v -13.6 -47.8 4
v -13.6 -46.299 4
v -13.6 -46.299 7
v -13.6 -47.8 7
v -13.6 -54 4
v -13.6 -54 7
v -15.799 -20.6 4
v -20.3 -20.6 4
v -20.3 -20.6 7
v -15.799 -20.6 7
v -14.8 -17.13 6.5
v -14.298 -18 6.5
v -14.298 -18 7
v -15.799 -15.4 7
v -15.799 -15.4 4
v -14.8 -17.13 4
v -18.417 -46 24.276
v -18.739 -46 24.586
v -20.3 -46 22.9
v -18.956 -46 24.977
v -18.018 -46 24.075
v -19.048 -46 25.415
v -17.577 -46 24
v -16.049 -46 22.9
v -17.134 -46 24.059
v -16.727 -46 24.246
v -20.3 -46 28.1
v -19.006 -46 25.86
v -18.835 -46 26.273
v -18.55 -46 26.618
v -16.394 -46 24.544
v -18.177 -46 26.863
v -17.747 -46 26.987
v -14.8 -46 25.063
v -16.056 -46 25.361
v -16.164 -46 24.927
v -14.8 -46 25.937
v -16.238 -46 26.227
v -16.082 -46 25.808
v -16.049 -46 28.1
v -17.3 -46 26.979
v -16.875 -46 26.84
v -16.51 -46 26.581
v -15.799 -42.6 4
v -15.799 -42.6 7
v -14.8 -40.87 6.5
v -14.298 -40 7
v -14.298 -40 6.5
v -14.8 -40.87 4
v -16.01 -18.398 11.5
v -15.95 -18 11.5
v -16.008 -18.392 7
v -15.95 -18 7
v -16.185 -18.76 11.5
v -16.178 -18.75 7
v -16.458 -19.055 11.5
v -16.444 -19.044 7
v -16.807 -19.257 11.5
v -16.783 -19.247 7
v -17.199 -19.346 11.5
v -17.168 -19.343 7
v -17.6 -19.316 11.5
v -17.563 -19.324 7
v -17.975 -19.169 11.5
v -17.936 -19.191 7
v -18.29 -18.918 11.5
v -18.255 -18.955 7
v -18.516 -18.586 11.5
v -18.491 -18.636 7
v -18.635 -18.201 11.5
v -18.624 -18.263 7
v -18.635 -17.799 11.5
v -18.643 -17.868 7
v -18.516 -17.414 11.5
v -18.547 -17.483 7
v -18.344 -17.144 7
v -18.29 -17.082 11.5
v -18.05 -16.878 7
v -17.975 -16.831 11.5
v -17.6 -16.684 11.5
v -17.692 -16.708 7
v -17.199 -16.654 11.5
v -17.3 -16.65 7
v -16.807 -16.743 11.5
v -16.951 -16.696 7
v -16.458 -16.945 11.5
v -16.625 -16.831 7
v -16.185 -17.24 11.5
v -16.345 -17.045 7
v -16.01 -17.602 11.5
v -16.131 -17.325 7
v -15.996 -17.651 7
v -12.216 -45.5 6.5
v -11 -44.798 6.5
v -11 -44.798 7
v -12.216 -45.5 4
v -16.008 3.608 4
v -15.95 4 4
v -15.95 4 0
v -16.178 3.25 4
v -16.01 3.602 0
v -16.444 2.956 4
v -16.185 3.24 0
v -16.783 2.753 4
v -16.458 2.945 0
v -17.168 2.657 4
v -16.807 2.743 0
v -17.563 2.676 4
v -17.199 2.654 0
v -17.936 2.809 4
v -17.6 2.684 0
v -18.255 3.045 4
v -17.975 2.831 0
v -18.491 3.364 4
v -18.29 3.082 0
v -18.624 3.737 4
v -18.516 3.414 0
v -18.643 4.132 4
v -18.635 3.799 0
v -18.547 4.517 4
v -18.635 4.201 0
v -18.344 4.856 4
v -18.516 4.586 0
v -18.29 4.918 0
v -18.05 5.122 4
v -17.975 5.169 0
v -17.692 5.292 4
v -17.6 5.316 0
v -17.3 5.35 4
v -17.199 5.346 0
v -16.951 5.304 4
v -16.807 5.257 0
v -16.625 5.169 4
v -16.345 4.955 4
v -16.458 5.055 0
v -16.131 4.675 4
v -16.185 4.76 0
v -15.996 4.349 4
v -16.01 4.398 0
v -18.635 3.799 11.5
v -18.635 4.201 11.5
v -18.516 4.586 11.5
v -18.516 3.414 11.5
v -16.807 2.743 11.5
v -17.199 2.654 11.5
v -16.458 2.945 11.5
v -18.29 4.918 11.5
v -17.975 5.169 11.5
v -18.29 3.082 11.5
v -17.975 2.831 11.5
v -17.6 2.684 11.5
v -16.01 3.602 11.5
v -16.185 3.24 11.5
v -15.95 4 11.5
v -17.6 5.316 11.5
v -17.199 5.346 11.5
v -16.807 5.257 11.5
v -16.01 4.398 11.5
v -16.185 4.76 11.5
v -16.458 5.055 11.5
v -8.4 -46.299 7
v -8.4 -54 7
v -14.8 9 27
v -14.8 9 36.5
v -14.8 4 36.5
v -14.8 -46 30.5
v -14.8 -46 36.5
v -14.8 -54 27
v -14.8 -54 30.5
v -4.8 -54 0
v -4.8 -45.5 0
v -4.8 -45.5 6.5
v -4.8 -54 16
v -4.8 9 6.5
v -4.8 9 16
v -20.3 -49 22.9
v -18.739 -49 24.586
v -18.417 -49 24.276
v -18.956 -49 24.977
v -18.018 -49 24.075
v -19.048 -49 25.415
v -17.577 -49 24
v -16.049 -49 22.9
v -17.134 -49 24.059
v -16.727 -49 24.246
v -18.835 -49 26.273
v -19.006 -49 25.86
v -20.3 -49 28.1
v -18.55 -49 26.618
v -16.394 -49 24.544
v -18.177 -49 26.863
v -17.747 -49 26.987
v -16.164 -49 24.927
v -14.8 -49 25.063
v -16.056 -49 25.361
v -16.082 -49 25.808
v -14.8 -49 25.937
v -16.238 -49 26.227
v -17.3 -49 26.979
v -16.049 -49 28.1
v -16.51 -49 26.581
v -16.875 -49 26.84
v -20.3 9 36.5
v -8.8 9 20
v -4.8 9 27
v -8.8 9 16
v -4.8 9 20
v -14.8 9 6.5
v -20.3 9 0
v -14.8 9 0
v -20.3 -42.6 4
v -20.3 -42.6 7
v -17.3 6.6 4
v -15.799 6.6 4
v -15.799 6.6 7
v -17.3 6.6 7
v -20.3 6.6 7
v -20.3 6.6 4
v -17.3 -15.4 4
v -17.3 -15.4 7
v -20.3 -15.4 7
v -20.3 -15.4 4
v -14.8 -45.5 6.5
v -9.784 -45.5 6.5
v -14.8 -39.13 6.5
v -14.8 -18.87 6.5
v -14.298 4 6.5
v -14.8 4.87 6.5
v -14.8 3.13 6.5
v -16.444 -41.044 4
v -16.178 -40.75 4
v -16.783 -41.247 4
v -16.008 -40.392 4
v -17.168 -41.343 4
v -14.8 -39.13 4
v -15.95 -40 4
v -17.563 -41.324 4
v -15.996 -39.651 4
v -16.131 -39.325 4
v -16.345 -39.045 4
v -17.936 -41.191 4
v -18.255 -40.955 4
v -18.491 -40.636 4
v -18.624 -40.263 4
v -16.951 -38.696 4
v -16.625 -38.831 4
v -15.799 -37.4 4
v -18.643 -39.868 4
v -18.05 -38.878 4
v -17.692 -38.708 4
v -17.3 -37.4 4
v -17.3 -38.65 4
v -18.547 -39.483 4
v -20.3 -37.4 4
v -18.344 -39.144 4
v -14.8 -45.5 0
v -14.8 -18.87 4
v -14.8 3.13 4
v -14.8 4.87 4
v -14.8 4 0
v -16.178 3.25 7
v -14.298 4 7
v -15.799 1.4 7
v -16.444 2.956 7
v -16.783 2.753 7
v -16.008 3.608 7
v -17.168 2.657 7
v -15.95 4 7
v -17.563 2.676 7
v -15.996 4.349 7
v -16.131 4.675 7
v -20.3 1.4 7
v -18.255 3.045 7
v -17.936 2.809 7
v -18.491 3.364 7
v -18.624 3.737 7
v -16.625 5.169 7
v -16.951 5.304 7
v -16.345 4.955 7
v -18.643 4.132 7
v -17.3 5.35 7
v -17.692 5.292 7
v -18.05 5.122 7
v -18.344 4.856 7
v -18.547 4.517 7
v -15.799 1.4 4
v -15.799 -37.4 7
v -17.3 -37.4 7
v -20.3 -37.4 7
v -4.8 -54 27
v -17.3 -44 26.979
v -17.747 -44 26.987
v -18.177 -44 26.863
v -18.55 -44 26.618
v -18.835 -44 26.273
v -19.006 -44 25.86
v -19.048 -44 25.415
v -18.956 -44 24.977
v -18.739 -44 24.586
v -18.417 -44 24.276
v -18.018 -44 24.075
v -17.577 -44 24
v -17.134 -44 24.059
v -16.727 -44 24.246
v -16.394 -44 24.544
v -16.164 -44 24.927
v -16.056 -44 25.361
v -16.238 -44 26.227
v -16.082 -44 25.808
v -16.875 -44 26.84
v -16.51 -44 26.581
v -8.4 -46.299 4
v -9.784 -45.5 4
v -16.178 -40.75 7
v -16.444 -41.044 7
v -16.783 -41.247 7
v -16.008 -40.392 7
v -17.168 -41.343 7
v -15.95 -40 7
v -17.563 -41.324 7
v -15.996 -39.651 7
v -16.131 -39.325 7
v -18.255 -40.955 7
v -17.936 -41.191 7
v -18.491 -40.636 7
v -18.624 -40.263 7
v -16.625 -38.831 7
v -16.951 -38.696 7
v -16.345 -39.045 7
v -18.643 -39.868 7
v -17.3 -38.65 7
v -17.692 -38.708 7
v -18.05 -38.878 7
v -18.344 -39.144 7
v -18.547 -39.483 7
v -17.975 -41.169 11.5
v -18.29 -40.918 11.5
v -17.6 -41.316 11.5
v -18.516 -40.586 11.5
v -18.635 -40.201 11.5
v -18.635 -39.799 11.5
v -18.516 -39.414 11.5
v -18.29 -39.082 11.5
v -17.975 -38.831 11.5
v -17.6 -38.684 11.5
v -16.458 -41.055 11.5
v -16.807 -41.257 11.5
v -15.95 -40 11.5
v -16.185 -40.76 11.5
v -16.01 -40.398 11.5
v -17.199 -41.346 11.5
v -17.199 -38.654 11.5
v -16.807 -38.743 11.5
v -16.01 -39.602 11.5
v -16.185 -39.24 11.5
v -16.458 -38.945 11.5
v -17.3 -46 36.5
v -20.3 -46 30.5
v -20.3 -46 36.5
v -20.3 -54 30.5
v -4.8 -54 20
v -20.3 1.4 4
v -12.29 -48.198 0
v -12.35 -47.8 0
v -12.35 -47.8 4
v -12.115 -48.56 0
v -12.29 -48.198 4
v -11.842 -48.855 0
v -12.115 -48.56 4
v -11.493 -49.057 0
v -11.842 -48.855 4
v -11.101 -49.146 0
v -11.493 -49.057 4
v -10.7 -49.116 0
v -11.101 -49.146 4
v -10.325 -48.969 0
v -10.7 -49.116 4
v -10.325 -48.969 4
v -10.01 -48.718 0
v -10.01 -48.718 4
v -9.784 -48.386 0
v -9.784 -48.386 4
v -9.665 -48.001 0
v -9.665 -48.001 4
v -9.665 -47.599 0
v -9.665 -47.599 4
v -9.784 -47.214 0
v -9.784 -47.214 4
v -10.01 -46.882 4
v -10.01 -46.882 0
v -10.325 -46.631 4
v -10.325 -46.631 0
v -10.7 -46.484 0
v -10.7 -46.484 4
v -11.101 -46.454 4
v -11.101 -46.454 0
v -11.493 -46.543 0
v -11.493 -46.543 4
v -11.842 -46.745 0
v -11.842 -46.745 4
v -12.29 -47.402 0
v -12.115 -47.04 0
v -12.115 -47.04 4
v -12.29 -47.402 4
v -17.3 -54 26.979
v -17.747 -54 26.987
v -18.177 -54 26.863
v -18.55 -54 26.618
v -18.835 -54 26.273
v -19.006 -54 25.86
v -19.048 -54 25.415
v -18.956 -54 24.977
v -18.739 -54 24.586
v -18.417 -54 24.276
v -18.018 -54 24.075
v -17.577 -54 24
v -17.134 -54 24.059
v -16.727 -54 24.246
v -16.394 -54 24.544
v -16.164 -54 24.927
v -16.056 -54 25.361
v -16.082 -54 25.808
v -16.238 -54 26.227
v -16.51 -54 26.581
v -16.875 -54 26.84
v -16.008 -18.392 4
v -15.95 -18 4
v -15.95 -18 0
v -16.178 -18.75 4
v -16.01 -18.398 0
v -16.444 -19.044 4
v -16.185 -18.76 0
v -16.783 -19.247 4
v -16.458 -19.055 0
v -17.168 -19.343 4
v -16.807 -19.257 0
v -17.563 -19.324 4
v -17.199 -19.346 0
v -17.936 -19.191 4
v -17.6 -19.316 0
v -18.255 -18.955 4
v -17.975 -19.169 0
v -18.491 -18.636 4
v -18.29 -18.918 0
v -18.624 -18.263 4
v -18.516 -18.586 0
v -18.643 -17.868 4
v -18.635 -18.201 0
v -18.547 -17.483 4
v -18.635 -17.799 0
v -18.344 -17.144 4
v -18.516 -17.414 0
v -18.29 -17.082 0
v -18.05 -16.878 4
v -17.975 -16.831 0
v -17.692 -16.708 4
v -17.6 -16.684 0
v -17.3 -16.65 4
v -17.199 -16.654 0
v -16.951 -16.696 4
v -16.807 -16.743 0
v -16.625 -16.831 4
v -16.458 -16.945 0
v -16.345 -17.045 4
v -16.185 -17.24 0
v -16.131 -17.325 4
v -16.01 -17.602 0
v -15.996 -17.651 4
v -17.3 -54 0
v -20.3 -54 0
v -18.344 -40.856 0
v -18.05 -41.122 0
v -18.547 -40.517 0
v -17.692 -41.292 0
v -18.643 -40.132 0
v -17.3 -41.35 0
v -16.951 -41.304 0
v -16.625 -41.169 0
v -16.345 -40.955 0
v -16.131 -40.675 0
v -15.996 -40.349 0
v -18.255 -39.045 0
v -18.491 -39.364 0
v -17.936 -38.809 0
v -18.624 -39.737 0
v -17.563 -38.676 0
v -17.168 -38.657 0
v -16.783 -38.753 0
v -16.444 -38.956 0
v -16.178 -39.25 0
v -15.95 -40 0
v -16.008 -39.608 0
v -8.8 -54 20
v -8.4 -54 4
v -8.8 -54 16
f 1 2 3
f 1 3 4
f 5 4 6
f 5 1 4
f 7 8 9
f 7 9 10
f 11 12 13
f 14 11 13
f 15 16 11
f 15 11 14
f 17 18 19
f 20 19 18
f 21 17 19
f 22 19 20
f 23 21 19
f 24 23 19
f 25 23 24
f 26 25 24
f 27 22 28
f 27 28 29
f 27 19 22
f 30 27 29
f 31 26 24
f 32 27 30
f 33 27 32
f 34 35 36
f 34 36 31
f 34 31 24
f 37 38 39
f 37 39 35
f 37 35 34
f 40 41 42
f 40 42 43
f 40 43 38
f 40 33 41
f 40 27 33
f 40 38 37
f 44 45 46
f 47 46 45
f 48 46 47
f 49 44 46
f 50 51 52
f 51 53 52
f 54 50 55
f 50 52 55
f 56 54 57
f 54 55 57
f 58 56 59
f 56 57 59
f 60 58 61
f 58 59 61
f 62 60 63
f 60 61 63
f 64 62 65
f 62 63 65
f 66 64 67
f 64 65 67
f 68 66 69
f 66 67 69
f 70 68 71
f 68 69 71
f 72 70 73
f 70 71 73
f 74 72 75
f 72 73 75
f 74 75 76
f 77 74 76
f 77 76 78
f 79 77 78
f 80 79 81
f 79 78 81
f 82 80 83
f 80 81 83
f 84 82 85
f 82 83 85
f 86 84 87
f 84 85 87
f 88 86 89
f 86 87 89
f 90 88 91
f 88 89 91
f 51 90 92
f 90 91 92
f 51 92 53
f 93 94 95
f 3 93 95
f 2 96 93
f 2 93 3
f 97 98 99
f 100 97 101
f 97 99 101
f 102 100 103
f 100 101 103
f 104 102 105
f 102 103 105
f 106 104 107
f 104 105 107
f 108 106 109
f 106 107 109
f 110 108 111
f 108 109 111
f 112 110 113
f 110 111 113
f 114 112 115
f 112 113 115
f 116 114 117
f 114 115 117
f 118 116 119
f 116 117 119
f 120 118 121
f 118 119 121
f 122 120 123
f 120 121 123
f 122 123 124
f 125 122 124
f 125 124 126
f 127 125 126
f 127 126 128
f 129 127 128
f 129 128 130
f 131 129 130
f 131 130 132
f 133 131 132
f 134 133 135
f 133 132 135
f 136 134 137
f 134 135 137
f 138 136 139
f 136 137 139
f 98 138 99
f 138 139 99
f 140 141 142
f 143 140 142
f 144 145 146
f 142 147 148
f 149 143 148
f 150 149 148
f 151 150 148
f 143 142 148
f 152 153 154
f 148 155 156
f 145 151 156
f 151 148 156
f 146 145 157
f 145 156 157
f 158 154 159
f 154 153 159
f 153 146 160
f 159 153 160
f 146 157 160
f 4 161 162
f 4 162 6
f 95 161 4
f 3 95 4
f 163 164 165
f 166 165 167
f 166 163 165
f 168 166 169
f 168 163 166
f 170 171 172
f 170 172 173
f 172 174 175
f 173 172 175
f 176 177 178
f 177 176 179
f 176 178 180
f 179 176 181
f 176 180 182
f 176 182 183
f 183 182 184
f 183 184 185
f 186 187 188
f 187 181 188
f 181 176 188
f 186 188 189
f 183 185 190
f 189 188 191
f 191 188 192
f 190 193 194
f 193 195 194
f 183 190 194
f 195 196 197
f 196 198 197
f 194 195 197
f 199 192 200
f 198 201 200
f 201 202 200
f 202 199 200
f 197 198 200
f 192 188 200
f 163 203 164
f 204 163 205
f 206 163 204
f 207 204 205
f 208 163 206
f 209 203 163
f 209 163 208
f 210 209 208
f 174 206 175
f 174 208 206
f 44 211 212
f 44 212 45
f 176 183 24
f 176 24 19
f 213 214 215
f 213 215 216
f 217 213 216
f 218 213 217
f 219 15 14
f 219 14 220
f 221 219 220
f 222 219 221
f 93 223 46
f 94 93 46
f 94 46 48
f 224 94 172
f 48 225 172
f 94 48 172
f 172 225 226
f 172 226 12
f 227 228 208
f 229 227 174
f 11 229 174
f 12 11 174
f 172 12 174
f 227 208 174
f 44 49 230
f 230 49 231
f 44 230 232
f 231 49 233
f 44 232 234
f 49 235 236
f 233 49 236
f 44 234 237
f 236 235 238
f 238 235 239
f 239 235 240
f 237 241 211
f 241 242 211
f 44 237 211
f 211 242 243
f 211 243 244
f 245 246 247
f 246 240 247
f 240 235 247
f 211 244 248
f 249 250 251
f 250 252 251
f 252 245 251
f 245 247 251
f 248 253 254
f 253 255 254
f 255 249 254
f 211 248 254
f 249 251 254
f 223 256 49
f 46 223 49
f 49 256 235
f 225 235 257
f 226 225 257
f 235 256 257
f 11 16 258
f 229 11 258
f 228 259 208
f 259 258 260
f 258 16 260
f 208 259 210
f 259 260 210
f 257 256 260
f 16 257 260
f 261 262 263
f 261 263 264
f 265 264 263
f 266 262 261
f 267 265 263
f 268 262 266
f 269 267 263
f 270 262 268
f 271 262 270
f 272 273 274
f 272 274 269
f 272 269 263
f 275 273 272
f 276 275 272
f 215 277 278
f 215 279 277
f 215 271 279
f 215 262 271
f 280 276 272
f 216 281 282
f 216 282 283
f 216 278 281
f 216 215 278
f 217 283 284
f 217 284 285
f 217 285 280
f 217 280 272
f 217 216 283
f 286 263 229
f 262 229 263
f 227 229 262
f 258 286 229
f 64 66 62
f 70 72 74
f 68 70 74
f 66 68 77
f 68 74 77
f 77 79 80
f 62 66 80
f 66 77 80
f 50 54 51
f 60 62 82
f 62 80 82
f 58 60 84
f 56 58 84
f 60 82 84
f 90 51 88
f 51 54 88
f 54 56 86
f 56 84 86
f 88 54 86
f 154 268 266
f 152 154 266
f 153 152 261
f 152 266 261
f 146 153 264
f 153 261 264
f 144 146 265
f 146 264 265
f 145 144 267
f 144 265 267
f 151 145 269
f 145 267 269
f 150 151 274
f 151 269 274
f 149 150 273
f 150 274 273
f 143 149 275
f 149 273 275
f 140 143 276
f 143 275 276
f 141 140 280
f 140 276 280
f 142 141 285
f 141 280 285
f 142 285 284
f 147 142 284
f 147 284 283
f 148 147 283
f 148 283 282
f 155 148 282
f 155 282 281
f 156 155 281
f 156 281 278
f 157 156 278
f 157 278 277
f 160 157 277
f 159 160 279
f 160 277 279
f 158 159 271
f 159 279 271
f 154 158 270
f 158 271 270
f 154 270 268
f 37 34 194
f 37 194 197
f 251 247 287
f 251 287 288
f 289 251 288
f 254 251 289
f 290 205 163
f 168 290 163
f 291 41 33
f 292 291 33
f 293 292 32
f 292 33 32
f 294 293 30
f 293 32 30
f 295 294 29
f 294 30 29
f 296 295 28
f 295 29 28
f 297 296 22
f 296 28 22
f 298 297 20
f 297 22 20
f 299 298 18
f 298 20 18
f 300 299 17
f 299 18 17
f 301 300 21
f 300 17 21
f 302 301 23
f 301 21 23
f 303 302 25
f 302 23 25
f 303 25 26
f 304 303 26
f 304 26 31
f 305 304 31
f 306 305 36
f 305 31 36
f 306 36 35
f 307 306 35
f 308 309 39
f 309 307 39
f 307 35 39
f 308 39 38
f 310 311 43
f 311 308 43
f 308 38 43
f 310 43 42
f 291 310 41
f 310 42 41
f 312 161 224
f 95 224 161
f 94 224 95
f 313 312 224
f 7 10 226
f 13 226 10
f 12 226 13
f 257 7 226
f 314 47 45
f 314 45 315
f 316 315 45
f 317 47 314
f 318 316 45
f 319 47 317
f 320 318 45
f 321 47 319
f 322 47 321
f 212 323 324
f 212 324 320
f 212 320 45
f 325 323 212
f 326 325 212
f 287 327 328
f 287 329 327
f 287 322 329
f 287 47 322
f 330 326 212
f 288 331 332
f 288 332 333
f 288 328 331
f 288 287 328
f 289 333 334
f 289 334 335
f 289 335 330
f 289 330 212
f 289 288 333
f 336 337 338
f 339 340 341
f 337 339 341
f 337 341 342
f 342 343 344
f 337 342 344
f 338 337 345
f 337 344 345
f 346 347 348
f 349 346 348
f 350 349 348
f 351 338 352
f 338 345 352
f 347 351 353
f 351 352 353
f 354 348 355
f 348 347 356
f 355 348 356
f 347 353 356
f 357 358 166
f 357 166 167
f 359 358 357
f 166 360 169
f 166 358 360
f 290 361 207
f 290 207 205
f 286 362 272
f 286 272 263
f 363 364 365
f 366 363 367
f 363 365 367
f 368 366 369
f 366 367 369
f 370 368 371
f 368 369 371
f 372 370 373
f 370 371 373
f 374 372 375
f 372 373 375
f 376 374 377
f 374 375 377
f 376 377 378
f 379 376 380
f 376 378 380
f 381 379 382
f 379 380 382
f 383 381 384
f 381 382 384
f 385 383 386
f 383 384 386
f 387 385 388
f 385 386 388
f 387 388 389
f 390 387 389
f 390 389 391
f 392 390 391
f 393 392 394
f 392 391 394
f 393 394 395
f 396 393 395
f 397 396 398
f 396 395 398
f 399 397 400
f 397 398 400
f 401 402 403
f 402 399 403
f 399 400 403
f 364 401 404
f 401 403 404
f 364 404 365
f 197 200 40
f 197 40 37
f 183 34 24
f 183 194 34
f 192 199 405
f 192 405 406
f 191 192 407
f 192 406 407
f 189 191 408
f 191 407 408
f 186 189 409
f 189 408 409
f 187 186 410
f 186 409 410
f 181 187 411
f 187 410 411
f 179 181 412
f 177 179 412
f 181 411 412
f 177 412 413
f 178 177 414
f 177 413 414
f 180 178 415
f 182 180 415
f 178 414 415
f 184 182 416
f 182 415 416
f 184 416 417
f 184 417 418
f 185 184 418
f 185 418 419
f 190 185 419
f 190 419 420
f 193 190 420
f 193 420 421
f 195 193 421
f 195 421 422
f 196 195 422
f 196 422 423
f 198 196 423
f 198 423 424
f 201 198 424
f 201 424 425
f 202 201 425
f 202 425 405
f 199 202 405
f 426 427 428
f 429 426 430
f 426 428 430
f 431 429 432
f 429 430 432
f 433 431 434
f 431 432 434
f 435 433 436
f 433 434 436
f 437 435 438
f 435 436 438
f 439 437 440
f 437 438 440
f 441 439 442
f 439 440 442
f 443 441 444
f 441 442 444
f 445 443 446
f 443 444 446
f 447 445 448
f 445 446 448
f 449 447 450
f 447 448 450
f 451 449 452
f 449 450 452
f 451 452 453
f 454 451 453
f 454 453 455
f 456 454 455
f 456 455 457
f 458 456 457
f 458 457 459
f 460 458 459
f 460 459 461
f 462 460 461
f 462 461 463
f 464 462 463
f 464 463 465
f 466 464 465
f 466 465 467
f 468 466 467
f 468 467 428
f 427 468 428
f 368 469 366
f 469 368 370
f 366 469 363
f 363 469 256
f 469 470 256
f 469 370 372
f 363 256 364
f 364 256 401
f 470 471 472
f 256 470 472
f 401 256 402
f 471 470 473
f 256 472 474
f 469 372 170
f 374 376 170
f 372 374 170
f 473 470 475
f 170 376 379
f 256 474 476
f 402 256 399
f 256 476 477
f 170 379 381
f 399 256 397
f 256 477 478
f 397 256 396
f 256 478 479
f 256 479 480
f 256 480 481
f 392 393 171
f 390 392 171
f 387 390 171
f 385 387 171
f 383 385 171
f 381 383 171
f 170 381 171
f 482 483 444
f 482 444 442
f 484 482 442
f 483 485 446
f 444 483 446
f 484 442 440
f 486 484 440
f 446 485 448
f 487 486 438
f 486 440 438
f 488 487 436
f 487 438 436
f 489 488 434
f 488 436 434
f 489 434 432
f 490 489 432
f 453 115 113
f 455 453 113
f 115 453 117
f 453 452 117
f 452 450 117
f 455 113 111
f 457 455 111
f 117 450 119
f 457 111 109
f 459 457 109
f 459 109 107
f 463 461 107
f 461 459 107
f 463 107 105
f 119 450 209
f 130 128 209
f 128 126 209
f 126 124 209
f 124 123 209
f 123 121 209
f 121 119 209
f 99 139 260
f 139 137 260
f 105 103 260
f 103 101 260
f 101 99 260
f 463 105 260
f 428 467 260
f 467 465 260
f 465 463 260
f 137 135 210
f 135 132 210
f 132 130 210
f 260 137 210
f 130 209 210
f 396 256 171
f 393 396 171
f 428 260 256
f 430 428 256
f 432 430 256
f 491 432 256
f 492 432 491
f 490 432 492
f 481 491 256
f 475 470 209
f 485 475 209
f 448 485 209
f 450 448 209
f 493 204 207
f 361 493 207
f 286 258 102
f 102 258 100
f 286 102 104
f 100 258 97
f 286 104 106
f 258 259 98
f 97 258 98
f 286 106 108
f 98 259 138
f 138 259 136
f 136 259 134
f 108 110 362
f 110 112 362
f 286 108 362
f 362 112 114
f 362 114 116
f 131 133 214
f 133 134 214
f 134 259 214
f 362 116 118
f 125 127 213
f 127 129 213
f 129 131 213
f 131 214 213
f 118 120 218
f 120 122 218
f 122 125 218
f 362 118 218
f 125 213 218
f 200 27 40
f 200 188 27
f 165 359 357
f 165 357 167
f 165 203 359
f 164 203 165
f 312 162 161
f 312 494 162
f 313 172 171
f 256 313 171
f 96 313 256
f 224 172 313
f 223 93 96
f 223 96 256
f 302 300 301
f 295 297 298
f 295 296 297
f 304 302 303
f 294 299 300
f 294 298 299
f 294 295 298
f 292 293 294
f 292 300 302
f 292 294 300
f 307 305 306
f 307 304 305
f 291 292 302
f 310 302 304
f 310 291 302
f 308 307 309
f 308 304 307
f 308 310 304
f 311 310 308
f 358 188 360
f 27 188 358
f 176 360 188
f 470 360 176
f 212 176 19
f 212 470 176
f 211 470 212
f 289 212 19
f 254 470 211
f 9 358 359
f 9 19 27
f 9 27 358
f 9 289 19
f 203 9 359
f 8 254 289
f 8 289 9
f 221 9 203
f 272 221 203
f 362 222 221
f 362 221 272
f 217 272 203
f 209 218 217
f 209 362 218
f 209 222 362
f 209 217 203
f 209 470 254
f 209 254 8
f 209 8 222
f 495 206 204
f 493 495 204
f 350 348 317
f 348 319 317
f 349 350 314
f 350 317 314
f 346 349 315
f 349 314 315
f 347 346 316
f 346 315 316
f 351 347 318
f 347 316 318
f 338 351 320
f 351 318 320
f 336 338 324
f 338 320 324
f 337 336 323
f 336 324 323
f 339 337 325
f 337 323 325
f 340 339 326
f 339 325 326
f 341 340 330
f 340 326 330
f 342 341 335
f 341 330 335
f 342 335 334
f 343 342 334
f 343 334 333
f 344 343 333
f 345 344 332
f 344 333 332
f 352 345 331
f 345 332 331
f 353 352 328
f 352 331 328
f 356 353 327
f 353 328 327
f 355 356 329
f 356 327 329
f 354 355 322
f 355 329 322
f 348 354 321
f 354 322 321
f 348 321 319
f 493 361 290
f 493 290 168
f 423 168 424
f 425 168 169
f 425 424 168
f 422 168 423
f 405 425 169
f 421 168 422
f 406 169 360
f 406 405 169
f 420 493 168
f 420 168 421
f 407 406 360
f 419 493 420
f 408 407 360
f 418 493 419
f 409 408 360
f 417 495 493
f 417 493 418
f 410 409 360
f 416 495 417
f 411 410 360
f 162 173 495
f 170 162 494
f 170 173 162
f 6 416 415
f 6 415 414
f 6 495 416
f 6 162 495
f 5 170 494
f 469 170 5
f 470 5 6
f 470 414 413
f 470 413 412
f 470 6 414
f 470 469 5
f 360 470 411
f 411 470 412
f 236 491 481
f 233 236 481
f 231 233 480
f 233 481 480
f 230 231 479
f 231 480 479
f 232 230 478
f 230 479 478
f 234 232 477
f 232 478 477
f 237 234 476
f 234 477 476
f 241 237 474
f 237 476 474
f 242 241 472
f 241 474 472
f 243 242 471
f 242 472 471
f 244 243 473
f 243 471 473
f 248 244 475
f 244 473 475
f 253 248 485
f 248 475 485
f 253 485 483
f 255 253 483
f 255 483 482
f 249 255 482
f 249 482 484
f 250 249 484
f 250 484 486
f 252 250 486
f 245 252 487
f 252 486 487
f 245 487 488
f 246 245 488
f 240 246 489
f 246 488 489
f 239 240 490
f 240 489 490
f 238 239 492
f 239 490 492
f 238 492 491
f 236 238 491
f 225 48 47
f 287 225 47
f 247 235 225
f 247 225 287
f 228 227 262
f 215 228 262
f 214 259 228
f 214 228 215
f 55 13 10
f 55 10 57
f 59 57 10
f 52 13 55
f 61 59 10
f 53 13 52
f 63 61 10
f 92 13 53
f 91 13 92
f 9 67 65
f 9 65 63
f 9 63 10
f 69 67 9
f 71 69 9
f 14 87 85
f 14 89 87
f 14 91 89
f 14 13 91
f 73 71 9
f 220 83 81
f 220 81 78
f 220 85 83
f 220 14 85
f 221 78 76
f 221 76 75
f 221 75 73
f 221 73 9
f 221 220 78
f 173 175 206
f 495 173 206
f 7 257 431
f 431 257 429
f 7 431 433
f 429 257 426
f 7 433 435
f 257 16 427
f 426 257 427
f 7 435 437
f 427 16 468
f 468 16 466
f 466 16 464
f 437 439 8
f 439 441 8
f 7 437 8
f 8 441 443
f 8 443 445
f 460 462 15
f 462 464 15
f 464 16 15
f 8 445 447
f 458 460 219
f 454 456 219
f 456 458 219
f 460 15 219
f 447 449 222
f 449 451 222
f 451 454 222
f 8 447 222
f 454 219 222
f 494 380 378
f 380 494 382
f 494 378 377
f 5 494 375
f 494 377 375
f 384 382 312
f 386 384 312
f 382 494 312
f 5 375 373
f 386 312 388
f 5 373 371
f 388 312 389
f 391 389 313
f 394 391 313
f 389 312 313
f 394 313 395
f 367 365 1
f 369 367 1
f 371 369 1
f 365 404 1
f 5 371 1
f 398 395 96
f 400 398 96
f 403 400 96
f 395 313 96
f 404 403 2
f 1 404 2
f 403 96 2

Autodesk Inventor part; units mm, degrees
ref_plane "Work Plane1" through (0, 0, 0) normal (0, 0, 1) x (1, 0, 0)
sketch "Sketch1" plane through (0, 0, 0) normal (0, 0, 1) x (1, 0, 0)
  circle A0 centre (-17.3, 4) radius 1.35 projected
  circle A1 centre (-17.3, -18) radius 1.35 projected
  circle A2 centre (-17.3, -40) radius 1.35 projected
  line L0 (-17.3, 4) -> (-14.8, 4)
  line L1 (-14.8, 4) -> (-14.8, 9)
  line L2 (-14.8, 9) -> (-20.3, 9)
  line L3 (-17.3, -40) -> (-17.3, -54)
  line L4 (-14.8, 4) -> (-14.8, -54)
  line L5 (-14.8, -54) -> (-17.3, -54)
  line L6 (-17.3, -54) -> (-20.3, -54)
  line L7 (-20.3, -54) -> (-20.3, 9)
  point P0 (0, 0)
  dimension "d0" = 2.5
  dimension "d1" = 5
  dimension "d2" = 5.5
  dimension "d3" = 14
extrude "Extrusion1" add sketch "Sketch1" along normal blind 36.5
sketch "Sketch2" plane through (-20.3, -54, 0) normal (0, -1, 0) x (1, 0, 0)
  line L0 (0, 0) -> (5.5, 0) projected
  line L1 (5.5, 0) -> (5.5, 36.5) projected
  line L2 (0, 36.5) -> (5.5, 36.5) projected
  line L3 (0, 0) -> (0, 36.5) projected
  line L4 (2.75, 36.5) -> (2.75, 25.5)
  circle A0 centre (2.75, 25.5) radius 1.5
  point P0 (20.3, 0)
  dimension "d6" = 11
  dimension "d7" = 3
extrude "Extrusion2" cut sketch "Sketch2" against normal blind 10 contours A0
sketch "Sketch3" plane through (-20.3, -54, 0) normal (-1, 0, 0) x (0, 0, 1)
  line L0 (0, 63) -> (0, 0) projected
  line L1 (0, 0) -> (36.5, 0) projected
  line L2 (36.5, 63) -> (36.5, 0) projected
  line L3 (0, 63) -> (36.5, 63) projected
  line L4 (0, 0) -> (36.5, 0) projected
  line L5 (36.5, 0) -> (28.5, 0)
  line L6 (28.5, 0) -> (28.5, 8)
  line L7 (28.5, 8) -> (36.5, 8)
  line L8 (36.5, 8) -> (36.5, 0)
  point P0 (0, 54)
  dimension "d10" = 8
  dimension "d11" = 8
extrude "Extrusion3" cut sketch "Sketch3" against normal blind 10 contours L6 L7 L2 L1
sketch "Sketch4" plane through (-20.3, 9, 0) normal (0, 1, 0) x (1, 0, 0)
  line L0 (5.5, 0) -> (0, 0) projected
  line L1 (0, 0) -> (0, -36.5) projected
  line L2 (5.5, -36.5) -> (0, -36.5) projected
  line L3 (5.5, 0) -> (5.5, -36.5) projected
  line L4 (6.8, -6) -> (8.8, -6) projected
  line L5 (6.8, -6) -> (5.5, -6)
  line L6 (5.5, -6) -> (5.5, -6.5)
  line L7 (5.5, 0) -> (5.5, -28.5) projected
  line L8 (5.5, -6.5) -> (15.5, -6.5)
  line L9 (15.5, -6.5) -> (15.5, -11.5)
  line L10 (15.5, -11.5) -> (5.5, -11.5)
  line L11 (5.5, -11.5) -> (5.5, -6.5)
  point P0 (20.3, 0)
  dimension "d14" = 0.5
  dimension "d15" = 10
  dimension "d16" = 5
extrude "Extrusion4" add sketch "Sketch4" against normal up to surface (63 mm away) contours L8 L9 L10 L3
sketch "Sketch5" plane through (-4.8, 9, 6.5) normal (0, 0, -1) x (-1, 0, 0)
  circle A0 centre (12.5, -49) radius 1.35 projected
  circle A1 centre (12.5, -27) radius 1.35 projected
  circle A2 centre (12.5, -5) radius 1.35 projected
  line L0 (10, -63) -> (10, 0) projected
  line L1 (15.5, -63) -> (10, -63) projected
  line L2 (15.5, 0) -> (15.5, -63) projected
  line L3 (10, 0) -> (15.5, 0) projected
  line L4 (0, -63) -> (10, -63) projected
  line L5 (10, 0) -> (10, -63) projected
  line L6 (0, 0) -> (10, 0) projected
  line L7 (0, 0) -> (0, -63) projected
  line L8 (-19.8, 5.5) -> (-16.3, 5.5) projected
  line L9 (-19.8, 5.5) -> (-24.9, -0.5) projected
  line L10 (-24.9, -0.5) -> (-24.9, -53.6) projected
  line L11 (-24.9, -53.6) -> (-19.8, -59.6) projected
  line L12 (-19.8, -59.6) -> (10.2, -59.6) projected
  line L13 (10.2, -59.6) -> (15.3, -53.6) projected
  line L14 (15.3, -53.6) -> (15.3, -0.5) projected
  line L15 (15.3, -0.5) -> (10.2, 5.5) projected
  line L16 (6.7, 5.5) -> (10.2, 5.5) projected
  arc A3 (9.7, 2.5) -> (6.7, 5.5) centre (6.7, 2.5) ccw projected
  line L17 (9.7, -51) -> (9.7, 2.5) projected
  arc A4 (6.7, -54) -> (9.7, -51) centre (6.7, -51) ccw projected
  line L18 (-16.3, -54) -> (6.7, -54) projected
  arc A5 (-19.3, -51) -> (-16.3, -54) centre (-16.3, -51) ccw projected
  line L19 (-19.3, 2.5) -> (-19.3, -51) projected
  arc A6 (-16.3, 5.5) -> (-19.3, 2.5) centre (-16.3, 2.5) ccw projected
  circle A7 centre (12.5, -5) radius 1.35 projected
  circle A8 centre (12.5, -27) radius 1.35 projected
  circle A9 centre (12.5, -49) radius 1.35 projected
  circle A10 centre (6.2, -56.8) radius 1.35 projected
  circle A11 centre (-22.1, -5) radius 1.35 projected
  circle A12 centre (-22.1, -27) radius 1.35 projected
  circle A13 centre (-22.1, -49) radius 1.35 projected
  circle A14 centre (-15.8, -56.8) radius 1.35 projected
  line L20 (10, 0) -> (10, -63) projected
  line L21 (10, -63) -> (0, -63)
  line L22 (0, -63) -> (0, -54.5)
  line L23 (0, -54.5) -> (10, -54.5)
  line L24 (10, -54.5) -> (10, -63)
  point P0 (-4.8, -9)
  dimension "d19" = 10
  dimension "d20" = 8.5
extrude "Extrusion5" add sketch "Sketch5" along normal up to surface (6.5 mm away) contours L0 L12 L7 L23 | L0 L4 L7 L12
ref_plane "Work Plane2" through (0, 0, 4) normal (0, 0, -1) x (-1, 0, 0)
sketch "Sketch6" plane through (0, 0, 4) normal (0, 0, -1) x (-1, 0, 0)
  circle A0 centre (17.3, 4) radius 1.35 projected
  circle A1 centre (17.3, -18) radius 1.35 projected
  circle A2 centre (11, -47.8) radius 1.35 projected
  circle A3 centre (17.3, -40) radius 1.35 projected
  circle A4 centre (17.3, -18) radius 1.35 projected
  circle A5 centre (17.3, 4) radius 1.35 projected
  line L0 (20.3, -54) -> (4.8, -54) projected
  line L1 (20.3, 9) -> (20.3, -54) projected
  line L2 (14.8, 9) -> (20.3, 9) projected
  line L3 (14.8, -45.5) -> (14.8, 9) projected
  line L4 (14.8, -45.5) -> (4.8, -45.5) projected
  line L5 (4.8, -45.5) -> (4.8, -54) projected
  circle A6 centre (11, -47.8) radius 1.35 projected
  circle A7 centre (11, -47.8) radius 1.35 projected
  line L6 (17.3, 4) -> (17.3, 6.6)
  line L7 (18.8011, 6.6) -> (20.3022, 4)
  line L8 (20.3022, 4) -> (18.8011, 1.4)
  line L9 (18.8011, 1.4) -> (15.7989, 1.4)
  line L10 (15.7989, 1.4) -> (14.2978, 4)
  line L11 (14.2978, 4) -> (15.7989, 6.6)
  line L12 (15.7989, 6.6) -> (18.8011, 6.6)
  line L13 (18.8011, 1.4) -> (28.5961, 1.4)
  line L14 (28.5961, 1.4) -> (28.5961, 6.6)
  line L15 (28.5961, 6.6) -> (18.8011, 6.6)
  line L16 (18.8011, 6.6) -> (18.8011, 1.4)
  line L17 (11, -47.8) -> (13.6, -47.8)
  line L18 (13.6, -49.3011) -> (11, -50.8022)
  line L19 (11, -50.8022) -> (8.4, -49.3011)
  line L20 (8.4, -49.3011) -> (8.4, -46.2989)
  line L21 (8.4, -46.2989) -> (11, -44.7978)
  line L22 (11, -44.7978) -> (13.6, -46.2989)
  line L23 (13.6, -46.2989) -> (13.6, -49.3011)
  line L24 (13.6, -49.3011) -> (8.4, -49.3011)
  line L25 (8.4, -49.3011) -> (8.4, -56.2377)
  line L26 (8.4, -56.2377) -> (13.6, -56.2377)
  line L27 (13.6, -56.2377) -> (13.6, -49.3011)
  line L28 (18.8011, -15.4) -> (20.3022, -18)
  line L29 (20.3022, -18) -> (18.8011, -20.6)
  line L30 (18.8011, -20.6) -> (28.5961, -20.6)
  line L31 (28.5961, -20.6) -> (28.5961, -15.4)
  line L32 (28.5961, -15.4) -> (18.8011, -15.4)
  line L33 (18.8011, -15.4) -> (18.8011, -20.6)
  line L34 (17.3, -18) -> (17.3, -15.4)
  line L35 (18.8011, -20.6) -> (15.7989, -20.6)
  line L36 (15.7989, -15.4) -> (18.8011, -15.4)
  line L37 (15.7989, -20.6) -> (14.2978, -18)
  line L38 (14.2978, -18) -> (15.7989, -15.4)
  line L39 (18.8011, -37.4) -> (20.3022, -40)
  line L40 (20.3022, -40) -> (18.8011, -42.6)
  line L41 (18.8011, -42.6) -> (28.5961, -42.6)
  line L42 (28.5961, -42.6) -> (28.5961, -37.4)
  line L43 (28.5961, -37.4) -> (18.8011, -37.4)
  line L44 (18.8011, -37.4) -> (18.8011, -42.6)
  line L45 (17.3, -40) -> (17.3, -37.4)
  line L46 (18.8011, -42.6) -> (15.7989, -42.6)
  line L47 (15.7989, -37.4) -> (18.8011, -37.4)
  line L48 (15.7989, -42.6) -> (14.2978, -40)
  line L49 (14.2978, -40) -> (15.7989, -37.4)
  point P0 (0, 0)
  dimension "d24" = 2.6
  dimension "d25" = 2.6
  dimension "d28" = 22
extrude "Extrusion6" cut sketch "Sketch6" against normal blind 3 contours L12 L16 L9 L10 L3 L11 | L15 L1 L7 | L7 L8 L16 | L3 L10 L11 | L1 L15 L14 L13 | L1 L13 L8 | L38 L36 L33 L35 L37 L3 | L3 L37 L38 | L32 L31 L30 L1 | L1 L28 L32 | L29 L33 L28 | L1 L30 L29 | L49 L47 L44 L46 L48 L3 | L3 L48 L49 | L43 L42 L41 L1 | L1 L39 L43 | L40 L44 L39 | L1 L41 L40 | A2 | L22 L23 L24 L20 L21 L4 | L4 L21 L22 | L27 L26 L25 L0 | L0 L25 L19 L18 L27 | L24 L18 L19
sketch "Sketch7" plane through (0, 0, 36.5) normal (0, 0, 1) x (1, 0, 0)
  line L0 (-20.3, -46) -> (-14.8, -46) projected
  line L1 (-14.8, -46) -> (-14.8, 9) projected
  line L2 (-14.8, 9) -> (-20.3, 9) projected
  line L3 (-20.3, 9) -> (-20.3, -46) projected
  circle A0 centre (-17.3, 4) radius 1.35 projected
  circle A1 centre (-17.3, -18) radius 1.35 projected
  circle A2 centre (-17.3, -40) radius 1.35 projected
  point P0 (0, 0)
extrude "Extrusion7" add sketch "Sketch7" against normal blind 25 contours A0 | A1 | A2
ref_plane "Work Plane3" through (-20.3, -49, 28.5) normal (0, -1, 0) x (1, 0, 0)
sketch "Sketch8" plane through (-20.3, -49, 28.5) normal (0, -1, 0) x (1, 0, 0)
  circle A0 centre (2.75, -3) radius 1.5 projected
  line L0 (2.75, -3) -> (2.75, -0.4)
  line L1 (4.2511, -0.4) -> (5.7522, -3)
  line L2 (5.7522, -3) -> (4.2511, -5.6)
  line L3 (4.2511, -5.6) -> (1.2489, -5.6)
  line L4 (1.2489, -5.6) -> (-0.2522, -3)
  line L5 (-0.2522, -3) -> (1.2489, -0.4)
  line L6 (1.2489, -0.4) -> (4.2511, -0.4)
  line L7 (1.2489, -0.4) -> (-2.7612, -0.4)
  line L8 (-2.7612, -0.4) -> (-2.7612, -5.6)
  line L9 (-2.7612, -5.6) -> (1.2489, -5.6)
  line L10 (1.2489, -5.6) -> (1.2489, -0.4)
  point P0 (20.3, -28.5)
  dimension "d38" = 2.6
extrude "Extrusion8" cut sketch "Sketch8" against normal blind 3 contours A0 L0 L6 L1 L2 L3 L10 | A0 L10 L6 L0 | L10 L4 L5 | L9 L8 L7 L5 L4
sketch "Sketch9" plane through (-20.3, 9, 0) normal (0, 1, 0) x (1, 0, 0)
  line L0 (5.5, 0) -> (0, 0) projected
  line L1 (0, 0) -> (0, -36.5) projected
  line L2 (5.5, -36.5) -> (0, -36.5) projected
  line L3 (5.5, -11.5) -> (5.5, -36.5) projected
  line L4 (5.5, -11.5) -> (15.5, -11.5) projected
  line L5 (15.5, -11.5) -> (15.5, -6.5) projected
  line L6 (15.5, -6.5) -> (5.5, -6.5) projected
  line L7 (5.5, 0) -> (5.5, -6.5) projected
  line L8 (5.5, -11.5) -> (15.5, -11.5) projected
  line L9 (5.5, -11.5) -> (5.5, -28.5) projected
  line L10 (15.5, -11.5) -> (5.5, -11.5)
  line L11 (5.5, -20) -> (15.5, -20)
  line L12 (5.5, -20) -> (11.5, -20)
  line L13 (5.5, -24) -> (5.5, -20)
  line L14 (15.5, -24) -> (15.5, -27)
  line L15 (15.5, -27) -> (5.5, -27)
  line L16 (5.5, -27) -> (5.5, -24)
  line L17 (5.5, -11.5) -> (15.5, -11.5)
  line L18 (15.5, -11.5) -> (15.5, -16)
  line L19 (15.5, -16) -> (5.5, -16)
  line L20 (5.5, -16) -> (5.5, -11.5)
  line L21 (5.5, -16) -> (11.5, -16)
  line L22 (11.5, -16) -> (11.5, -20)
  line L23 (11.5, -20) -> (5.5, -20)
  line L24 (5.5, -20) -> (5.5, -16)
  line L25 (5.5, -20) -> (15.5, -20)
  line L26 (15.5, -20) -> (15.5, -27)
  line L27 (15.5, -27) -> (5.5, -27)
  line L28 (5.5, -27) -> (5.5, -20)
  point P0 (20.3, 0)
  dimension "d41" = 8.5
  dimension "d44" = 10
  dimension "d45" = 3
  dimension "d48" = 4.5
extrude "Extrusion9" add sketch "Sketch9" against normal up to surface (63 mm away) contours L18 L19 L3 L4 | L3 L11 L26 L14 L15 | L19 L22 L11 L3
sketch "Sketch10" plane through (-20.3, -54, 28.5) normal (0, -1, 0) x (1, 0, 0)
  point P0 (20.3, -28.5)
sketch "Sketch11" plane through (-20.3, -54, 28.5) normal (0, 0, 1) x (1, 0, 0)
  line L0 (5.5, 8) -> (5.5, 0) projected
  line L1 (0, 8) -> (5.5, 8) projected
  line L2 (0, 0) -> (0, 8) projected
  line L3 (5.5, 0) -> (0, 0) projected
  point P0 (20.3, 54)
extrude "Extrusion10" add sketch "Sketch11" along normal blind 2
properties part number "side"
